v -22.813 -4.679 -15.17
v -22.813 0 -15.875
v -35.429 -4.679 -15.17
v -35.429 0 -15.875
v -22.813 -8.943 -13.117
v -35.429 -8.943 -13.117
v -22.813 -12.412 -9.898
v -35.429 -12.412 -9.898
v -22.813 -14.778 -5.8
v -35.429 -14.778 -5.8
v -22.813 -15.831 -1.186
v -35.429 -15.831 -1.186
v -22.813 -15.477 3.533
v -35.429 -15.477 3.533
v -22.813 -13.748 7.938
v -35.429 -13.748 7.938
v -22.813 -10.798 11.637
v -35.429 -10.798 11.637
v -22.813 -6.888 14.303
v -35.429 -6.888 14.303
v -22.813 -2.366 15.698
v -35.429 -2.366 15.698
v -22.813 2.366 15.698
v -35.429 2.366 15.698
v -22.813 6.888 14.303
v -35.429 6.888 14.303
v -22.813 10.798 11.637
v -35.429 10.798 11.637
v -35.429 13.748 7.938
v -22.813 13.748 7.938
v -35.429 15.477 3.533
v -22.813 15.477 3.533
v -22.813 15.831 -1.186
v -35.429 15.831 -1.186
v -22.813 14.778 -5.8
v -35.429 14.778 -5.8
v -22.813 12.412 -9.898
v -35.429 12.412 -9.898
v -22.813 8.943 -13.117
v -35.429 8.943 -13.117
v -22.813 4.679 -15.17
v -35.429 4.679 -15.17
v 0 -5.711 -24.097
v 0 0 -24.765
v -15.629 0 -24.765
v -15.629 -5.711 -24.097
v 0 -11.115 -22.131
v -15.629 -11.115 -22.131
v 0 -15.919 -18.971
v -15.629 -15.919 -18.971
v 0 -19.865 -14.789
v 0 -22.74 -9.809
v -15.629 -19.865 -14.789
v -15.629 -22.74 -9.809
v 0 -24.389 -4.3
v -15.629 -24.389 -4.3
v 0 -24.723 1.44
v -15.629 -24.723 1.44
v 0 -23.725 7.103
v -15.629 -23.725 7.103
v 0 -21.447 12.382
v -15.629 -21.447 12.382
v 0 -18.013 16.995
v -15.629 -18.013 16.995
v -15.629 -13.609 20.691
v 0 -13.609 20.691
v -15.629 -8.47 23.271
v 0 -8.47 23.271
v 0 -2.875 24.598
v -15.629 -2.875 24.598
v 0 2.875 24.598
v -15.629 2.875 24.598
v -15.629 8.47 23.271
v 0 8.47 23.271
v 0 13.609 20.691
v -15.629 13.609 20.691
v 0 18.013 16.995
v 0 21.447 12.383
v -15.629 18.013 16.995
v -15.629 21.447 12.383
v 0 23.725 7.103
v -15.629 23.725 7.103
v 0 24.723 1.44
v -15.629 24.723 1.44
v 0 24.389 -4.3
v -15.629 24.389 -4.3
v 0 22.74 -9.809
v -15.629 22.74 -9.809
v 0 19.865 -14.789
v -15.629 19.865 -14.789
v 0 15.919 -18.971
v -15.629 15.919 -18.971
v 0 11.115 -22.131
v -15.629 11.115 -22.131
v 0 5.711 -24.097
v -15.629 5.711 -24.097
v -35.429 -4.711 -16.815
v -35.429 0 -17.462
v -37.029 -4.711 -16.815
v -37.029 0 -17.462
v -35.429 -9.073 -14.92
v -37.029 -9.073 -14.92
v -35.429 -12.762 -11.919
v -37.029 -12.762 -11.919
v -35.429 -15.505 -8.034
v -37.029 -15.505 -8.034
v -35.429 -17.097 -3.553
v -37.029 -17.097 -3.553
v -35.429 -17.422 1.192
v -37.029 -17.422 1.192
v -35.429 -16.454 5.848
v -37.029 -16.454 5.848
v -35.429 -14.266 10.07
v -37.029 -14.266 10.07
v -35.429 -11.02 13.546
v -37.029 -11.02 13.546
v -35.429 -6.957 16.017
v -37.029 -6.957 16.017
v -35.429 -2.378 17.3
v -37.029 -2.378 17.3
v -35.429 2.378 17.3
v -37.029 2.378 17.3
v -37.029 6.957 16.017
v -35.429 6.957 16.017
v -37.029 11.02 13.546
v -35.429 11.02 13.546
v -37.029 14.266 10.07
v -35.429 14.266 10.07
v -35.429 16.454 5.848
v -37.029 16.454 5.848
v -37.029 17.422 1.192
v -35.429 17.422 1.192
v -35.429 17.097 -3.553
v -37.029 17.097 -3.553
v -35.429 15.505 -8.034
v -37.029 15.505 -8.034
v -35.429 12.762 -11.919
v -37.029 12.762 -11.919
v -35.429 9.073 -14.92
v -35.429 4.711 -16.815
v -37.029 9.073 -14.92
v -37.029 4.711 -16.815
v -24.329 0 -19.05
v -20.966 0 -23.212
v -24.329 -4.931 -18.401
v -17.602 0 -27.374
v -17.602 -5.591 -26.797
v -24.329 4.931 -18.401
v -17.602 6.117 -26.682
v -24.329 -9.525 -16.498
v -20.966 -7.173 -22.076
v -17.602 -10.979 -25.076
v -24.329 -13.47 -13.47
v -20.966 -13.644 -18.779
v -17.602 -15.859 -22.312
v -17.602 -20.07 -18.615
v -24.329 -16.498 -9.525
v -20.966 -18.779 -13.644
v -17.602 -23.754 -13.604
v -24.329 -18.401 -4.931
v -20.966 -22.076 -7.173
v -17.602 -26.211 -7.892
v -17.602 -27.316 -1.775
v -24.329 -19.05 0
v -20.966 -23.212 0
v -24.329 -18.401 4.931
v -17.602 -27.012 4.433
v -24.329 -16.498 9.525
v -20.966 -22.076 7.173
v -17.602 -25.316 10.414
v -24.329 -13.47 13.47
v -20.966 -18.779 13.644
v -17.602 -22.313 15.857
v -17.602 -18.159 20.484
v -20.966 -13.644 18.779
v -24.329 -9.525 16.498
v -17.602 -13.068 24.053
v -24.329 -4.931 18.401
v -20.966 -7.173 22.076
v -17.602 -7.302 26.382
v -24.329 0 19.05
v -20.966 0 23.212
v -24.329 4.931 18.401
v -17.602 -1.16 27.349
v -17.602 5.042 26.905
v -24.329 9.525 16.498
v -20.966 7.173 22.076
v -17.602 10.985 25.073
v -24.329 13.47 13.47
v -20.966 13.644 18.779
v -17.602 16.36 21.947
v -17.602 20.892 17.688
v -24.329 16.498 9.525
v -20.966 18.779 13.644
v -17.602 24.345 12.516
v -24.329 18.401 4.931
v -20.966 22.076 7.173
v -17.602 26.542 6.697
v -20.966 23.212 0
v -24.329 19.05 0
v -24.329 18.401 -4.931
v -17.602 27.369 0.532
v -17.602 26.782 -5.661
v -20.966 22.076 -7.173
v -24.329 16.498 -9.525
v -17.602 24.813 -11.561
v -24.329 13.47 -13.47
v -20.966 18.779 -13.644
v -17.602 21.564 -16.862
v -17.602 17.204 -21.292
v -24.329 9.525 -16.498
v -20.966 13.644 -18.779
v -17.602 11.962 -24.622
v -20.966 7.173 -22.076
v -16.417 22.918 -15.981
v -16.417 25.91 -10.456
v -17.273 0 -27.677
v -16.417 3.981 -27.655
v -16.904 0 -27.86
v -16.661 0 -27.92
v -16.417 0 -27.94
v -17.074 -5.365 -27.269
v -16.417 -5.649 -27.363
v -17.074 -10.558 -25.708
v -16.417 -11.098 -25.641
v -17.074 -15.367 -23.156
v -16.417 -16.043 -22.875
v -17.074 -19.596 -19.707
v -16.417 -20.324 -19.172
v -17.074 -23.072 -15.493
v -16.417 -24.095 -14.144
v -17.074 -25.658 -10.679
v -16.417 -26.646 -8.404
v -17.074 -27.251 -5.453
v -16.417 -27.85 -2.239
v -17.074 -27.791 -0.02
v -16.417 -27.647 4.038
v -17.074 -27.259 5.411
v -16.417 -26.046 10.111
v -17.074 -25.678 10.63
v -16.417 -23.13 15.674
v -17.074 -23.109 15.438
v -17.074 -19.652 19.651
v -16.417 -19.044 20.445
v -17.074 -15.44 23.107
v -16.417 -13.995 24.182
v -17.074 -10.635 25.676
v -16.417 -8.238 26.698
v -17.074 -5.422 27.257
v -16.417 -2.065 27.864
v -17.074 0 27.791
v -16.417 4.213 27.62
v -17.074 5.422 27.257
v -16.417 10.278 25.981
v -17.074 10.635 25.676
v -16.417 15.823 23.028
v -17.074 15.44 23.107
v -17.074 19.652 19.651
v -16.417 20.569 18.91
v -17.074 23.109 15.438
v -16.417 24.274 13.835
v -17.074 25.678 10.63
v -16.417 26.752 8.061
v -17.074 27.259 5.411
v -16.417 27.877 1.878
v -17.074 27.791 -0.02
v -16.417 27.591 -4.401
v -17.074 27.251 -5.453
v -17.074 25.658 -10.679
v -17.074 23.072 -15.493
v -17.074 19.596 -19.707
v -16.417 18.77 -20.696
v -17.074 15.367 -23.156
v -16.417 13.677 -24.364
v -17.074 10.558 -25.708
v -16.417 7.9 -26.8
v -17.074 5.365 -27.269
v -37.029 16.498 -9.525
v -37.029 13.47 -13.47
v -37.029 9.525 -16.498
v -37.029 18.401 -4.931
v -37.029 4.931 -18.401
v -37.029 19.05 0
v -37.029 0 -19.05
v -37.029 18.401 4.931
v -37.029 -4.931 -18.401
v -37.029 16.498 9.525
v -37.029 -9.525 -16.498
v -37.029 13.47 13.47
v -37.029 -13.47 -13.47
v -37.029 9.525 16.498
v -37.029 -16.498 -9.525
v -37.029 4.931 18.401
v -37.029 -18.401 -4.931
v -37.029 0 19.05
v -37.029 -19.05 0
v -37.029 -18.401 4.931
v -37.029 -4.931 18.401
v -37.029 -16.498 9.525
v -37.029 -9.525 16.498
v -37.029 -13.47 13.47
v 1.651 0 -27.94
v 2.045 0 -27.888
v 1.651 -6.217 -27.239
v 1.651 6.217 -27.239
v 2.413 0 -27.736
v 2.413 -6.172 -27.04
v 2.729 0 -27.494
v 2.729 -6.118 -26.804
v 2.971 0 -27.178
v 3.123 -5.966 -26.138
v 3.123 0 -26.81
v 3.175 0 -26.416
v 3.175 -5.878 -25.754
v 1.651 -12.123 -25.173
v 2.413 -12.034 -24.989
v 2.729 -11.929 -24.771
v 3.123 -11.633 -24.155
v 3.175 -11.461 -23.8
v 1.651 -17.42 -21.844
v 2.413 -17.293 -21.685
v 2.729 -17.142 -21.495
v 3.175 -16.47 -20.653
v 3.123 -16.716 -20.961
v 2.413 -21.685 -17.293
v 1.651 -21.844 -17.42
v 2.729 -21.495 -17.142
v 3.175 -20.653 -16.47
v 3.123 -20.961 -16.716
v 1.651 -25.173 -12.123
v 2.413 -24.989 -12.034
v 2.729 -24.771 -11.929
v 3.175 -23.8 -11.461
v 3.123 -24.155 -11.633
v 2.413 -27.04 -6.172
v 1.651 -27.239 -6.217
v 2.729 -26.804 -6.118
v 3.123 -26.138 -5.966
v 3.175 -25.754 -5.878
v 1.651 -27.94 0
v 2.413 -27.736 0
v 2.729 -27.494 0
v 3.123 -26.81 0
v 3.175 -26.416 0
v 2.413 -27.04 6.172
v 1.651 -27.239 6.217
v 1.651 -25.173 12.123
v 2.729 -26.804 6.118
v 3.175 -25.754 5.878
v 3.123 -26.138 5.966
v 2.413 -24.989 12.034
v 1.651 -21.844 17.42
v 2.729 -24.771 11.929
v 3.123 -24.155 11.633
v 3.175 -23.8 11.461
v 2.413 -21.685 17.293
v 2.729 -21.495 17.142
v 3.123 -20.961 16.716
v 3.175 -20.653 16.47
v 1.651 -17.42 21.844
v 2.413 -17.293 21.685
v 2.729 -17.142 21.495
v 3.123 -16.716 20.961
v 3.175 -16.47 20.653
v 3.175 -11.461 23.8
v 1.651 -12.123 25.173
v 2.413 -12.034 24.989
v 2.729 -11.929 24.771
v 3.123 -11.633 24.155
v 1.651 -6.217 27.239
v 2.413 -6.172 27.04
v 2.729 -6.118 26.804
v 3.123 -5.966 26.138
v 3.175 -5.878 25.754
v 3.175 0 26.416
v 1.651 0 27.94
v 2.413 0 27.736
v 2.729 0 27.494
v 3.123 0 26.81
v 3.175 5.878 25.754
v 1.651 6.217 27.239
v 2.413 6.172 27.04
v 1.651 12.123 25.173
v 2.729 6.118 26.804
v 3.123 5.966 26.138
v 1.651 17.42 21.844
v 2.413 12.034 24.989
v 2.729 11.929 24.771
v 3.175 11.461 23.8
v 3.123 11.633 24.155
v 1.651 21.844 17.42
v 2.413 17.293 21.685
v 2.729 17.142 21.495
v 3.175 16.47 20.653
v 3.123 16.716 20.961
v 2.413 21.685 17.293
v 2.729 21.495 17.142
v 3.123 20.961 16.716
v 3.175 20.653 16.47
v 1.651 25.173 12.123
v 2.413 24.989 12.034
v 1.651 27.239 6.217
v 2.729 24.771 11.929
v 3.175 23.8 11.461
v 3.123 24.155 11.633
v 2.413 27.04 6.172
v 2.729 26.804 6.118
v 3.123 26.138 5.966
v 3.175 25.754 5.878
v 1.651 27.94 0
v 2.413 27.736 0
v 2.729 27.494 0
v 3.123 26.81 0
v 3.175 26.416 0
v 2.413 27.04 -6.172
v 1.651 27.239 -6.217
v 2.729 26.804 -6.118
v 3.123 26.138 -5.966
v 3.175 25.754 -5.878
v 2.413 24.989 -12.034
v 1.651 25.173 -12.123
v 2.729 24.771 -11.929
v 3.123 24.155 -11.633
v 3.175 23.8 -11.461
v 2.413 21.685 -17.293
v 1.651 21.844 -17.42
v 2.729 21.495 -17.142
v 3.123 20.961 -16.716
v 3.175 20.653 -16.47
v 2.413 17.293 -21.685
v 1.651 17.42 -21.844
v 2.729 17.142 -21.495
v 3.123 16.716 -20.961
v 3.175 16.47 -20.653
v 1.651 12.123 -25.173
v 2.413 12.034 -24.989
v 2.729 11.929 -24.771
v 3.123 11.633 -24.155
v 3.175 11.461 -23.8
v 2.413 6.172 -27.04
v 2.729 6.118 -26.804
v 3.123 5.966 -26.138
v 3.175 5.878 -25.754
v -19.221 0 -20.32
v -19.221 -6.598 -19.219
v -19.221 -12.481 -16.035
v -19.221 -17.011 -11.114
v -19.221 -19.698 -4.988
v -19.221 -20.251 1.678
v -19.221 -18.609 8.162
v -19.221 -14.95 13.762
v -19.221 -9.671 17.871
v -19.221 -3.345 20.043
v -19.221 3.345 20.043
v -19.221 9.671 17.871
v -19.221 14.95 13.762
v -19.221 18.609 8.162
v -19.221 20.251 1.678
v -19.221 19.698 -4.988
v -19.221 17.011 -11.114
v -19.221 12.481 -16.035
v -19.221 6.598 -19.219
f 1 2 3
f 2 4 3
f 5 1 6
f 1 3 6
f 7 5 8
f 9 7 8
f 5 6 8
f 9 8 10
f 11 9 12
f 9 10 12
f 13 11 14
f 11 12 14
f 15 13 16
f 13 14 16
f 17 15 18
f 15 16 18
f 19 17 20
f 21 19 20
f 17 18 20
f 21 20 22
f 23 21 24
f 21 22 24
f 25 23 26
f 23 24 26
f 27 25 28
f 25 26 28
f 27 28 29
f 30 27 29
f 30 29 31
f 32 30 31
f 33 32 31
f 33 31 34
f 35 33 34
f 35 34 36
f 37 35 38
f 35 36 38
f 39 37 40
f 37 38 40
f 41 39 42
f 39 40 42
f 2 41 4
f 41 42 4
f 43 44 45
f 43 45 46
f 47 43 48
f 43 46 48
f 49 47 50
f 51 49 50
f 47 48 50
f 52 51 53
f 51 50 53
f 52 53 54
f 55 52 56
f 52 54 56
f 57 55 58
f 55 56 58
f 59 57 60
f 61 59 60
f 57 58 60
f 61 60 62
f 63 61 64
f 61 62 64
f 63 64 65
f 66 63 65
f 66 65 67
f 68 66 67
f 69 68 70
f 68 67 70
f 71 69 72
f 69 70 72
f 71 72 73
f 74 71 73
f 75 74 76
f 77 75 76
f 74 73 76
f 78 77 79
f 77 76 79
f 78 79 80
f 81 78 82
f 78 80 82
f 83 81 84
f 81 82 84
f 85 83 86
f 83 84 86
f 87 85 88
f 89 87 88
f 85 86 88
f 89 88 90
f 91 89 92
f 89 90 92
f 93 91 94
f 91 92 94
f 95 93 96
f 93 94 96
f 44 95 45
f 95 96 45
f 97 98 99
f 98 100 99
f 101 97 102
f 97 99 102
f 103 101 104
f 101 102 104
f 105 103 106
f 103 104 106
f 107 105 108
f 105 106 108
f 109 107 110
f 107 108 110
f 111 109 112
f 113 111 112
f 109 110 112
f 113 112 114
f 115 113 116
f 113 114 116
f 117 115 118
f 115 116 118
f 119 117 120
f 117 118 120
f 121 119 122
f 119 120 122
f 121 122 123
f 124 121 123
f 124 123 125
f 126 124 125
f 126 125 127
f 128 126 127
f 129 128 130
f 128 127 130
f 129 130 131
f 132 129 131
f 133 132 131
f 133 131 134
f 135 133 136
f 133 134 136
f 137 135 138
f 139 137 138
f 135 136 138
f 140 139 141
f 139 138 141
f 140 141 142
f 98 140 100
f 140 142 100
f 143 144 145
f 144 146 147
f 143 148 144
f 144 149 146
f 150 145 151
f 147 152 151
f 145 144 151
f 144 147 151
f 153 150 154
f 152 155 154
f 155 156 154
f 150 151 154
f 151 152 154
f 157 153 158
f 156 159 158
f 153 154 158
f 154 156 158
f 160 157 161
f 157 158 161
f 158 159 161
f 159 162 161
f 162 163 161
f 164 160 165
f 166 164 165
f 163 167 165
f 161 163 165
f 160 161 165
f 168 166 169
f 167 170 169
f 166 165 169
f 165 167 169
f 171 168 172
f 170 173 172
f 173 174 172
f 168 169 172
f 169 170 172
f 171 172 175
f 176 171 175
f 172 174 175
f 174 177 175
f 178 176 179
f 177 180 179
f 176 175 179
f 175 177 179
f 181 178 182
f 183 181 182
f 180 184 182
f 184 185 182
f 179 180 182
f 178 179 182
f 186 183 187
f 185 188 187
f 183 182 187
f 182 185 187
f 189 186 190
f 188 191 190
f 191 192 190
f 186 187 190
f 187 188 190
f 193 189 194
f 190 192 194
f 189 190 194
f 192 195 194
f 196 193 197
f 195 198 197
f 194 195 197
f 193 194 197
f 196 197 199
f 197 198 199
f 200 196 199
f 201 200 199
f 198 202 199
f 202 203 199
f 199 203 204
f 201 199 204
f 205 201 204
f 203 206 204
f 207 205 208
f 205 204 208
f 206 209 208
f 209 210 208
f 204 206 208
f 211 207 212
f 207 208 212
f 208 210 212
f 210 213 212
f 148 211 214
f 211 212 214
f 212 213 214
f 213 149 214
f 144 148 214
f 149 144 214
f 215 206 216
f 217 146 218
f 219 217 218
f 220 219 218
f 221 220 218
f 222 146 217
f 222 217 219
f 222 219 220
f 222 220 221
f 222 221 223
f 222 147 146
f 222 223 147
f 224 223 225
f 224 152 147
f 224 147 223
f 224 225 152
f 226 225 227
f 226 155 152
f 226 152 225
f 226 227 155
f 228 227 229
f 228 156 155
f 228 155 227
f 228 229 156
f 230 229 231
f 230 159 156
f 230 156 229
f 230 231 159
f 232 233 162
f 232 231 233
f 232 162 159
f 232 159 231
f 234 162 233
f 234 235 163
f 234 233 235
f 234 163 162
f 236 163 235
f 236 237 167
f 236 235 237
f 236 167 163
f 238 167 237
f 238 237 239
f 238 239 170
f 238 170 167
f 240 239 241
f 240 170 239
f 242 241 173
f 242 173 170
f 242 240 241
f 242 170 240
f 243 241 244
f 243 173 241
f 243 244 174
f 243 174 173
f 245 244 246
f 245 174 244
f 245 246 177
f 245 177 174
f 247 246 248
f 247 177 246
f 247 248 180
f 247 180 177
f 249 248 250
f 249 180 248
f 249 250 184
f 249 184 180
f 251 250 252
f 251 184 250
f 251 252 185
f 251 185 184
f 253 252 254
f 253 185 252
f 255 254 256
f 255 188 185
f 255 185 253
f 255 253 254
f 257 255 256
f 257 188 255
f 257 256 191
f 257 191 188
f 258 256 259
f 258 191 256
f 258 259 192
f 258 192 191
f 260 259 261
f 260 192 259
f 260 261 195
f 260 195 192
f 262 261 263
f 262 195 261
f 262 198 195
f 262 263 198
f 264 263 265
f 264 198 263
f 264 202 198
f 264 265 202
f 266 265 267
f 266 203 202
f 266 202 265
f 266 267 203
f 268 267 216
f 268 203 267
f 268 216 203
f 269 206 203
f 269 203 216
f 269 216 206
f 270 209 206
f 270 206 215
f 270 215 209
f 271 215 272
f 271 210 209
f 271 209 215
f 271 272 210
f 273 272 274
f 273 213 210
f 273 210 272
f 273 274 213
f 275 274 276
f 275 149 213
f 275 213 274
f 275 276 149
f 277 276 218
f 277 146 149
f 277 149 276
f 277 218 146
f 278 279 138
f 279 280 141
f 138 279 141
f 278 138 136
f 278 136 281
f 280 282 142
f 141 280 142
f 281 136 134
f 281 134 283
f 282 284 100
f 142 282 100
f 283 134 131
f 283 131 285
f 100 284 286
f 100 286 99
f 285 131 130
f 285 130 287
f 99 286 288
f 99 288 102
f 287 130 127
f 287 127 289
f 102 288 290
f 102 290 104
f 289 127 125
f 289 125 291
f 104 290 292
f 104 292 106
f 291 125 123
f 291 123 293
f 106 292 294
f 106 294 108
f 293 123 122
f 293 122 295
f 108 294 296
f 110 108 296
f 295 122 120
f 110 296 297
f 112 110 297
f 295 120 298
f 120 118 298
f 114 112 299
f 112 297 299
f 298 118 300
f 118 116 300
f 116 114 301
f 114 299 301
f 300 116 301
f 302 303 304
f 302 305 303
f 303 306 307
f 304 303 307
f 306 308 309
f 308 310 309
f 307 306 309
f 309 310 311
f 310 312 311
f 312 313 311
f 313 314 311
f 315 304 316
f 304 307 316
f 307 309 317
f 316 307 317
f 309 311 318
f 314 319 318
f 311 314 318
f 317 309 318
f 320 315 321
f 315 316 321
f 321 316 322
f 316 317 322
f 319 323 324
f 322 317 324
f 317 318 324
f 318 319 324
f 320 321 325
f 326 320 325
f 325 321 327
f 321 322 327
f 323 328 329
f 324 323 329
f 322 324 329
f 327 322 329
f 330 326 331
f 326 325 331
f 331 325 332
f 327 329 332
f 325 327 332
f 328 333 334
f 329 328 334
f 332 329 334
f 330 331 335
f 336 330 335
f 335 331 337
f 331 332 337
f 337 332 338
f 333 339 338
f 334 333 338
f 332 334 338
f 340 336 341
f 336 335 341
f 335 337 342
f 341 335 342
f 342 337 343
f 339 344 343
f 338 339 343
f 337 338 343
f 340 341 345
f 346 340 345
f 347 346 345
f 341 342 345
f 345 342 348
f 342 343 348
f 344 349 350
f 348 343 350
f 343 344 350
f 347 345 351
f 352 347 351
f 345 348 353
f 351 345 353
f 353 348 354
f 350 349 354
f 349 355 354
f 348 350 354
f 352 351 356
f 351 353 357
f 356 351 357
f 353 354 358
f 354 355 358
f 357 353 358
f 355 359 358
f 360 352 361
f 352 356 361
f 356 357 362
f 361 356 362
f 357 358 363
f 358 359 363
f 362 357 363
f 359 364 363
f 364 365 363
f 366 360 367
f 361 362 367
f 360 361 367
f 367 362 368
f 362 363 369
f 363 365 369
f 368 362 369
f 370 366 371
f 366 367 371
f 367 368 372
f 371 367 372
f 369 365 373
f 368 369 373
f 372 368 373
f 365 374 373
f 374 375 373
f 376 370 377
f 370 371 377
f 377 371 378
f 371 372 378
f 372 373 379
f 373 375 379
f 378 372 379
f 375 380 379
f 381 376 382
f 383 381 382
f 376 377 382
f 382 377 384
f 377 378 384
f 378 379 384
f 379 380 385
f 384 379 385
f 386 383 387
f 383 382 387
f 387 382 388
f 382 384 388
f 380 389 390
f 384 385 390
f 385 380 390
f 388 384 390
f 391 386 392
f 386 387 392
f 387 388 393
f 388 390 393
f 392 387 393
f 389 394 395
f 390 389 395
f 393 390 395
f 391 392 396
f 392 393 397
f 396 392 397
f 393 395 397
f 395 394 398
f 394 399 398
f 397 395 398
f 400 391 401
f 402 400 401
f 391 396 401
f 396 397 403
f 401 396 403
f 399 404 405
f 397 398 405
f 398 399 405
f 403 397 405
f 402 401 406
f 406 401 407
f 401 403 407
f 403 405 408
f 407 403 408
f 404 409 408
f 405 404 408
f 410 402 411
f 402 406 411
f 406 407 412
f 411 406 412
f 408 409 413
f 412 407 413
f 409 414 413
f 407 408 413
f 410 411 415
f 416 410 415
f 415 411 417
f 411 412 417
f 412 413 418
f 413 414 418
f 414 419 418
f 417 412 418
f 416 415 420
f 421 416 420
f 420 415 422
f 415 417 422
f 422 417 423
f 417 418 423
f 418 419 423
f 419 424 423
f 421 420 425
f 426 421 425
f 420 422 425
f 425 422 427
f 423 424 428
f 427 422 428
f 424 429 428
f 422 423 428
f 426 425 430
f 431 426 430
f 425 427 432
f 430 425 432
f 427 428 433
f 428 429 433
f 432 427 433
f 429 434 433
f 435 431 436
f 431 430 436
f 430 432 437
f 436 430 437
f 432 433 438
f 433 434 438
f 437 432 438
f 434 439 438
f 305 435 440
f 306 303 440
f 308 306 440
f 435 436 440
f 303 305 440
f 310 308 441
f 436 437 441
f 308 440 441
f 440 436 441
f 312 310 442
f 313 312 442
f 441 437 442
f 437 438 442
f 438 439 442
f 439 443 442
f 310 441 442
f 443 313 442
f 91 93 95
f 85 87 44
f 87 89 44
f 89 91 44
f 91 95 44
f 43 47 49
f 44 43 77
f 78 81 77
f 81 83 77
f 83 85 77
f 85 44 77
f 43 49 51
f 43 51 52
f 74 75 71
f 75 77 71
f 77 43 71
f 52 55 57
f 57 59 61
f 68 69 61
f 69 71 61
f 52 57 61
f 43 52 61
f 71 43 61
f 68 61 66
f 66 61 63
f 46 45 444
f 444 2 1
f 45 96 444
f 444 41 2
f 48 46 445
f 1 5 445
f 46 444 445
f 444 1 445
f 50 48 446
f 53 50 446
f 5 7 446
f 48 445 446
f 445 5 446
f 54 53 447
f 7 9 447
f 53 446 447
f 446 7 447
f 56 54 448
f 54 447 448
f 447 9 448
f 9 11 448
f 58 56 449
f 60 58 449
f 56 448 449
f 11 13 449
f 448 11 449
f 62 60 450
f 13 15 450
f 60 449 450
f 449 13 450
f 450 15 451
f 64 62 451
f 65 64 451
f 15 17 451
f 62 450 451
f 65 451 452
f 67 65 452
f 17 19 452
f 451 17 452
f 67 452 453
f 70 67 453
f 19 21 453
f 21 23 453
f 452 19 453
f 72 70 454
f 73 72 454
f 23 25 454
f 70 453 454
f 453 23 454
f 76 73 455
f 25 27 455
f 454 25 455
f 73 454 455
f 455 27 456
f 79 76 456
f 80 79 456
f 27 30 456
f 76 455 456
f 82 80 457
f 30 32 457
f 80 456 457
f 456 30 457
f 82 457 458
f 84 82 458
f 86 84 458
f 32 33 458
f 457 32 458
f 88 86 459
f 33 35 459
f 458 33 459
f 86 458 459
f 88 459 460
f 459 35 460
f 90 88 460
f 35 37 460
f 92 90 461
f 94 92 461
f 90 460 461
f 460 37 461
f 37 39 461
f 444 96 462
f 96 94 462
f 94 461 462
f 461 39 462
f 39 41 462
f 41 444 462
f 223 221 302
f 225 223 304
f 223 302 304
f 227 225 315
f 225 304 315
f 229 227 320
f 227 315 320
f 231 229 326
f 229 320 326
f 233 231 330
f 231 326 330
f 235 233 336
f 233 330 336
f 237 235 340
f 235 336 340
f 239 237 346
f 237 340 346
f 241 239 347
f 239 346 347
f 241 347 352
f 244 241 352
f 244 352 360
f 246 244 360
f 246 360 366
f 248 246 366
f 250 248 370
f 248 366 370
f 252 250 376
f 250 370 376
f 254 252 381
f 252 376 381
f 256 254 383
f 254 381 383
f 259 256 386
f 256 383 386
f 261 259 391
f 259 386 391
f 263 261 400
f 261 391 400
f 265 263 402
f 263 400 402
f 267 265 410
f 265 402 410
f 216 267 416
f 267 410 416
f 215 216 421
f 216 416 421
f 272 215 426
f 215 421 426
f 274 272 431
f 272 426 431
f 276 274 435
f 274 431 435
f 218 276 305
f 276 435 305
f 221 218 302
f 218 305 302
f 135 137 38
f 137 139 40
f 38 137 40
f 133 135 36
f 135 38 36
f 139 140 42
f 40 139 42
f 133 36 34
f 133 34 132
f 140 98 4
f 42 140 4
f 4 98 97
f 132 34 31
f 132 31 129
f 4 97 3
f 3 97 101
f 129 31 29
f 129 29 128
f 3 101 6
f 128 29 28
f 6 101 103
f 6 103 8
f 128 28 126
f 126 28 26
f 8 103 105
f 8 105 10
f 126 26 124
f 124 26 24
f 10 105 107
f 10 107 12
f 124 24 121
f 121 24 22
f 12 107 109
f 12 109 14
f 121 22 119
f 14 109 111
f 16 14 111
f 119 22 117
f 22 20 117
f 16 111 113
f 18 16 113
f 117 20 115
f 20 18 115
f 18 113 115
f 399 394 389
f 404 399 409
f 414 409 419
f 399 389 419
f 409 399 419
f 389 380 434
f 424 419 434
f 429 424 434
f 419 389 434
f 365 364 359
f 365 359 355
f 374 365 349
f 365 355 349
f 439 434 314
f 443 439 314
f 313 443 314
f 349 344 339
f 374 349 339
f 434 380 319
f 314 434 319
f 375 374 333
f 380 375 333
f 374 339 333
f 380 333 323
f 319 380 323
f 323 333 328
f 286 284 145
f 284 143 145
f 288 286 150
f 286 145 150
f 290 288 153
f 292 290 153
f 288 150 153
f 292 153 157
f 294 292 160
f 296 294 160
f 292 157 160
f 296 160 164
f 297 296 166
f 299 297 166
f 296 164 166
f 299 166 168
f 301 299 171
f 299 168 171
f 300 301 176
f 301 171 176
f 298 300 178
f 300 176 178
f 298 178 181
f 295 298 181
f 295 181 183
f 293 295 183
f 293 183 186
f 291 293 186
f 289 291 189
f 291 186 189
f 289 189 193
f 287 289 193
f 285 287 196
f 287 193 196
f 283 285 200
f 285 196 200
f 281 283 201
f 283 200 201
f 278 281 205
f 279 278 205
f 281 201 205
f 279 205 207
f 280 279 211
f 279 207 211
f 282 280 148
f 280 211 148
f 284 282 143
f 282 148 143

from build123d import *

# Parameters (mm, degrees)
FILLET1_R = 1.524


with BuildPart() as part:
    # Sketch1 → Revolve1 (revolve)
    with BuildSketch(Plane(origin=(0, 0, 0), x_dir=(1, 0, 0), z_dir=(0, 1, 0))):
        Polygon((-37.029204897, 17.4625), (-37.029204897, 19.05), (-24.329204897, 19.05), (-17.145, 27.94), (3.175, 27.94), (3.175, 0), (0, 0), (0, 24.765), (-15.628644606, 24.765), (-22.812849503, 15.875), (-35.429004897, 15.875), (-35.429004897, 17.4625), align=None)
    revolve(axis=Axis((3.175, 0, 0), (-1, 0, 0)))

    # Fillet1
    fillet1_edges = [part.edges().sort_by_distance(p)[0] for p in [
        (3.175, 0, 27.94),
        (-17.145, 0, 27.94),
    ]]
    fillet(fillet1_edges, radius=FILLET1_R)


solid = part.part
